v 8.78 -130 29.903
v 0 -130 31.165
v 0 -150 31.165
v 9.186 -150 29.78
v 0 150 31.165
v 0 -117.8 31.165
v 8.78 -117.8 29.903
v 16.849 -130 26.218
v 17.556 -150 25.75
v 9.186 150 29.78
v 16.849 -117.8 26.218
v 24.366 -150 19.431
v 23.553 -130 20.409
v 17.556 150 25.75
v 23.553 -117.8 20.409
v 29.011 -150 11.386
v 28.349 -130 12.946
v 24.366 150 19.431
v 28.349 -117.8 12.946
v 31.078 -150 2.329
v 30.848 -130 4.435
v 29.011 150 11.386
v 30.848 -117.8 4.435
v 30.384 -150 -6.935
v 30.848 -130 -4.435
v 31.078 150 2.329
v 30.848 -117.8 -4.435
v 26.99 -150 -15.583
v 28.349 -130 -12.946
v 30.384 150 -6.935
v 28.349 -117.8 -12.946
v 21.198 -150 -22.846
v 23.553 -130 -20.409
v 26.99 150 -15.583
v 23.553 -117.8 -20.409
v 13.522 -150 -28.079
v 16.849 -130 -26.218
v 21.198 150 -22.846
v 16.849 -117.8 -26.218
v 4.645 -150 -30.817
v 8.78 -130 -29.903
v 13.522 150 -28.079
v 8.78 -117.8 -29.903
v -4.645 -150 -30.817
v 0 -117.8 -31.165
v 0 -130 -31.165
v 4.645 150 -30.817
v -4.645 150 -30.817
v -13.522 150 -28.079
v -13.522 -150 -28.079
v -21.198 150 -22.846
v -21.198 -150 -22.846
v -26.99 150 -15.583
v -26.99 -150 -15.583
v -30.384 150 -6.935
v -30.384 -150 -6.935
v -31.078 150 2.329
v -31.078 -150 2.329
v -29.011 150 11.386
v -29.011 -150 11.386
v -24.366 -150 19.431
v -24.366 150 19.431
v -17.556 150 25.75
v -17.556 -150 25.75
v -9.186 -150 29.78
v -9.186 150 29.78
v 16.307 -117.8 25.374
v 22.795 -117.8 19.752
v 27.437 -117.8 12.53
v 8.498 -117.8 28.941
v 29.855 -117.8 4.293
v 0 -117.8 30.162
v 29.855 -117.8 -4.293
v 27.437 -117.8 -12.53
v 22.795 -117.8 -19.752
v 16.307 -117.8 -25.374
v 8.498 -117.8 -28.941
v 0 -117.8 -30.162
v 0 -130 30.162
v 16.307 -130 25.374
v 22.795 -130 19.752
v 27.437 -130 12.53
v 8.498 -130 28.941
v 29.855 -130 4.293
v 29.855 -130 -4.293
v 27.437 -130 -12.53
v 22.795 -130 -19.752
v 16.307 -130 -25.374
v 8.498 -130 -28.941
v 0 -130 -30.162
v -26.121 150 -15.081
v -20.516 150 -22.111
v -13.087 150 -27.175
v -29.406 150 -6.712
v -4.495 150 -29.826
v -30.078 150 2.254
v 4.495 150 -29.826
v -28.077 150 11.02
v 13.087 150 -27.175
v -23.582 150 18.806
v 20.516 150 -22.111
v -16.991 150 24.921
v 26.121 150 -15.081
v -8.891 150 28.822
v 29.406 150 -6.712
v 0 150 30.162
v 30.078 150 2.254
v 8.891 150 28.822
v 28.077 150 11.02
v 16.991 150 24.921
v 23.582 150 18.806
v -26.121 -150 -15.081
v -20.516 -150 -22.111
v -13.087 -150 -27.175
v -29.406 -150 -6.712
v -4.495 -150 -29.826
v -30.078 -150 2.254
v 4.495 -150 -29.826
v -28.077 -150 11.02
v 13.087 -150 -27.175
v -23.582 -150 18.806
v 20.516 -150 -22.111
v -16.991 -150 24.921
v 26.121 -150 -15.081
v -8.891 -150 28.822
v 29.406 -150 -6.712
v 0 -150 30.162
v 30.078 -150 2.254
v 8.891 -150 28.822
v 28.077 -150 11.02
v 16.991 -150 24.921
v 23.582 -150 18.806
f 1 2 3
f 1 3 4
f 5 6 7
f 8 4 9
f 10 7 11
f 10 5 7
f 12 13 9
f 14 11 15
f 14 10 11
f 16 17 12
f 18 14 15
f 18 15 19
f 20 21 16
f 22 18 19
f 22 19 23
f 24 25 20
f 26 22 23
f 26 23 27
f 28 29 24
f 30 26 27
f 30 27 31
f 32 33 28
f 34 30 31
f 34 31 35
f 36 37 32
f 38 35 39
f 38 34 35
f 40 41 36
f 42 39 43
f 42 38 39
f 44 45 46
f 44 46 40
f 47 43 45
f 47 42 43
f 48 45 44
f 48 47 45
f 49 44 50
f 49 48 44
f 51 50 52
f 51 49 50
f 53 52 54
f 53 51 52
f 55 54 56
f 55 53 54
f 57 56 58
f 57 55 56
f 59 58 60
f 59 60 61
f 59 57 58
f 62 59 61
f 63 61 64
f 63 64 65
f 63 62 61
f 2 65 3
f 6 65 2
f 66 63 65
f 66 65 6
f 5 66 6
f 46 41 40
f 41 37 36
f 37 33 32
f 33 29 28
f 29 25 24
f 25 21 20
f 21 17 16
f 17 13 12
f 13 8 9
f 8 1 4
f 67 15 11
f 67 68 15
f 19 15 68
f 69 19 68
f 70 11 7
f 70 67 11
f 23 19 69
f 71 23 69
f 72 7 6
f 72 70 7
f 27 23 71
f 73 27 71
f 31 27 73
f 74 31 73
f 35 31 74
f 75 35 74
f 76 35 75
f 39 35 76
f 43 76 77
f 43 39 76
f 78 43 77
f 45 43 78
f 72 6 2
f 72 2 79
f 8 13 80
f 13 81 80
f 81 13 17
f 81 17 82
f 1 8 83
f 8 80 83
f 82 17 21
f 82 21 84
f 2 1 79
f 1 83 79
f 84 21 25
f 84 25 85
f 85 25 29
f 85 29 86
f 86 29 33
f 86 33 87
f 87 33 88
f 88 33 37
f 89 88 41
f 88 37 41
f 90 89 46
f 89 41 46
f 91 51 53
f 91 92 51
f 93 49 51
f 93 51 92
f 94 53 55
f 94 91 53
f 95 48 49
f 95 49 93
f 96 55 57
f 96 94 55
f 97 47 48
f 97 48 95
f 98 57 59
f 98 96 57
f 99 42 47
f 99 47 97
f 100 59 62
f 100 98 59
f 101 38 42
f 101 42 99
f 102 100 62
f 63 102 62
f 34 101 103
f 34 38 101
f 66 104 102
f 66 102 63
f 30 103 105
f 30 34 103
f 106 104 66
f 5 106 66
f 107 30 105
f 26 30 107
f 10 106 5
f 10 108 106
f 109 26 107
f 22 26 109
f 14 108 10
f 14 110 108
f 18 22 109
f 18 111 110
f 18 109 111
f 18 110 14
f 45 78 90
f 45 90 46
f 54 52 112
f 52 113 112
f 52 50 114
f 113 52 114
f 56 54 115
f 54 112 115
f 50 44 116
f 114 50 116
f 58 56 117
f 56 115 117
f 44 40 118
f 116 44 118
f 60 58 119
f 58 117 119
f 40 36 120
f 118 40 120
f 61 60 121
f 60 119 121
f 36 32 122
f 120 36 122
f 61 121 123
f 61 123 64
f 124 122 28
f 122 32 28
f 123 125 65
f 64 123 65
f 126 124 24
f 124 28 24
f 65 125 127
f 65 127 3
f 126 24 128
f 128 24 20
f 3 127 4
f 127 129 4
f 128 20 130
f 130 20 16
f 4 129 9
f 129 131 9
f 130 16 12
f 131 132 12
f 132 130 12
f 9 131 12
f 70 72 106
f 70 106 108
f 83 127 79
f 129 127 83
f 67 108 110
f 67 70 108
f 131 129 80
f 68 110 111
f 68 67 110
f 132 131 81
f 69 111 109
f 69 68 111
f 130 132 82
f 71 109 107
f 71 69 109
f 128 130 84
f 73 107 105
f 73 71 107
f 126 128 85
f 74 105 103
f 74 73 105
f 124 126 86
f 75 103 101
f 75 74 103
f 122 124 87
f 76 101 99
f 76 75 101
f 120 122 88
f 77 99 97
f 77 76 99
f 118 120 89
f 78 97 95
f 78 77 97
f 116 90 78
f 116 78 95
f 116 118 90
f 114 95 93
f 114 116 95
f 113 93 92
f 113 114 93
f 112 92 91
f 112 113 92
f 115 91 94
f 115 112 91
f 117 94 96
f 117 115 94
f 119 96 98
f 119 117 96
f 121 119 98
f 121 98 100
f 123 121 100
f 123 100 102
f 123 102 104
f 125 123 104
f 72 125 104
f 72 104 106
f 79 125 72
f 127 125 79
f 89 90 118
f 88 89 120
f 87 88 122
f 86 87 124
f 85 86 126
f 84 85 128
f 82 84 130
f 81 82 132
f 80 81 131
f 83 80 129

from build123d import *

# Parameters (mm, degrees)
SKETCH1_R           = 31.165
SKETCH1_R_2         = 30.1625
BOSS_EXTRUDE1_DEPTH = 150
SKETCH2_W           = 31.165
SKETCH2_H           = 62.33
SLOT_DEPTH          = 12.2


with BuildPart() as part:
    # Sketch1 → Boss-Extrude1 (new, symmetric)
    with BuildSketch(Plane(origin=(0, 0, 0), x_dir=(1, 0, 0), z_dir=(0, 1, 0))):
        with Locations(Location((0, 0, 0), (0, 0, 270))):
            Circle(SKETCH1_R)
        with Locations(Location((0, 0, 0), (0, 0, 270))):
            Circle(SKETCH1_R_2, mode=Mode.SUBTRACT)
    extrude(amount=BOSS_EXTRUDE1_DEPTH, both=True)

    # Sketch2 → Slot (cut)
    with BuildSketch(Plane(origin=(0, -130, 0), x_dir=(-1, 0, 0), z_dir=(0, -1, 0))):
        with Locations((-15.5825, 0)):
            Rectangle(SKETCH2_W, SKETCH2_H)
    extrude(amount=-SLOT_DEPTH, mode=Mode.SUBTRACT)


solid = part.part
